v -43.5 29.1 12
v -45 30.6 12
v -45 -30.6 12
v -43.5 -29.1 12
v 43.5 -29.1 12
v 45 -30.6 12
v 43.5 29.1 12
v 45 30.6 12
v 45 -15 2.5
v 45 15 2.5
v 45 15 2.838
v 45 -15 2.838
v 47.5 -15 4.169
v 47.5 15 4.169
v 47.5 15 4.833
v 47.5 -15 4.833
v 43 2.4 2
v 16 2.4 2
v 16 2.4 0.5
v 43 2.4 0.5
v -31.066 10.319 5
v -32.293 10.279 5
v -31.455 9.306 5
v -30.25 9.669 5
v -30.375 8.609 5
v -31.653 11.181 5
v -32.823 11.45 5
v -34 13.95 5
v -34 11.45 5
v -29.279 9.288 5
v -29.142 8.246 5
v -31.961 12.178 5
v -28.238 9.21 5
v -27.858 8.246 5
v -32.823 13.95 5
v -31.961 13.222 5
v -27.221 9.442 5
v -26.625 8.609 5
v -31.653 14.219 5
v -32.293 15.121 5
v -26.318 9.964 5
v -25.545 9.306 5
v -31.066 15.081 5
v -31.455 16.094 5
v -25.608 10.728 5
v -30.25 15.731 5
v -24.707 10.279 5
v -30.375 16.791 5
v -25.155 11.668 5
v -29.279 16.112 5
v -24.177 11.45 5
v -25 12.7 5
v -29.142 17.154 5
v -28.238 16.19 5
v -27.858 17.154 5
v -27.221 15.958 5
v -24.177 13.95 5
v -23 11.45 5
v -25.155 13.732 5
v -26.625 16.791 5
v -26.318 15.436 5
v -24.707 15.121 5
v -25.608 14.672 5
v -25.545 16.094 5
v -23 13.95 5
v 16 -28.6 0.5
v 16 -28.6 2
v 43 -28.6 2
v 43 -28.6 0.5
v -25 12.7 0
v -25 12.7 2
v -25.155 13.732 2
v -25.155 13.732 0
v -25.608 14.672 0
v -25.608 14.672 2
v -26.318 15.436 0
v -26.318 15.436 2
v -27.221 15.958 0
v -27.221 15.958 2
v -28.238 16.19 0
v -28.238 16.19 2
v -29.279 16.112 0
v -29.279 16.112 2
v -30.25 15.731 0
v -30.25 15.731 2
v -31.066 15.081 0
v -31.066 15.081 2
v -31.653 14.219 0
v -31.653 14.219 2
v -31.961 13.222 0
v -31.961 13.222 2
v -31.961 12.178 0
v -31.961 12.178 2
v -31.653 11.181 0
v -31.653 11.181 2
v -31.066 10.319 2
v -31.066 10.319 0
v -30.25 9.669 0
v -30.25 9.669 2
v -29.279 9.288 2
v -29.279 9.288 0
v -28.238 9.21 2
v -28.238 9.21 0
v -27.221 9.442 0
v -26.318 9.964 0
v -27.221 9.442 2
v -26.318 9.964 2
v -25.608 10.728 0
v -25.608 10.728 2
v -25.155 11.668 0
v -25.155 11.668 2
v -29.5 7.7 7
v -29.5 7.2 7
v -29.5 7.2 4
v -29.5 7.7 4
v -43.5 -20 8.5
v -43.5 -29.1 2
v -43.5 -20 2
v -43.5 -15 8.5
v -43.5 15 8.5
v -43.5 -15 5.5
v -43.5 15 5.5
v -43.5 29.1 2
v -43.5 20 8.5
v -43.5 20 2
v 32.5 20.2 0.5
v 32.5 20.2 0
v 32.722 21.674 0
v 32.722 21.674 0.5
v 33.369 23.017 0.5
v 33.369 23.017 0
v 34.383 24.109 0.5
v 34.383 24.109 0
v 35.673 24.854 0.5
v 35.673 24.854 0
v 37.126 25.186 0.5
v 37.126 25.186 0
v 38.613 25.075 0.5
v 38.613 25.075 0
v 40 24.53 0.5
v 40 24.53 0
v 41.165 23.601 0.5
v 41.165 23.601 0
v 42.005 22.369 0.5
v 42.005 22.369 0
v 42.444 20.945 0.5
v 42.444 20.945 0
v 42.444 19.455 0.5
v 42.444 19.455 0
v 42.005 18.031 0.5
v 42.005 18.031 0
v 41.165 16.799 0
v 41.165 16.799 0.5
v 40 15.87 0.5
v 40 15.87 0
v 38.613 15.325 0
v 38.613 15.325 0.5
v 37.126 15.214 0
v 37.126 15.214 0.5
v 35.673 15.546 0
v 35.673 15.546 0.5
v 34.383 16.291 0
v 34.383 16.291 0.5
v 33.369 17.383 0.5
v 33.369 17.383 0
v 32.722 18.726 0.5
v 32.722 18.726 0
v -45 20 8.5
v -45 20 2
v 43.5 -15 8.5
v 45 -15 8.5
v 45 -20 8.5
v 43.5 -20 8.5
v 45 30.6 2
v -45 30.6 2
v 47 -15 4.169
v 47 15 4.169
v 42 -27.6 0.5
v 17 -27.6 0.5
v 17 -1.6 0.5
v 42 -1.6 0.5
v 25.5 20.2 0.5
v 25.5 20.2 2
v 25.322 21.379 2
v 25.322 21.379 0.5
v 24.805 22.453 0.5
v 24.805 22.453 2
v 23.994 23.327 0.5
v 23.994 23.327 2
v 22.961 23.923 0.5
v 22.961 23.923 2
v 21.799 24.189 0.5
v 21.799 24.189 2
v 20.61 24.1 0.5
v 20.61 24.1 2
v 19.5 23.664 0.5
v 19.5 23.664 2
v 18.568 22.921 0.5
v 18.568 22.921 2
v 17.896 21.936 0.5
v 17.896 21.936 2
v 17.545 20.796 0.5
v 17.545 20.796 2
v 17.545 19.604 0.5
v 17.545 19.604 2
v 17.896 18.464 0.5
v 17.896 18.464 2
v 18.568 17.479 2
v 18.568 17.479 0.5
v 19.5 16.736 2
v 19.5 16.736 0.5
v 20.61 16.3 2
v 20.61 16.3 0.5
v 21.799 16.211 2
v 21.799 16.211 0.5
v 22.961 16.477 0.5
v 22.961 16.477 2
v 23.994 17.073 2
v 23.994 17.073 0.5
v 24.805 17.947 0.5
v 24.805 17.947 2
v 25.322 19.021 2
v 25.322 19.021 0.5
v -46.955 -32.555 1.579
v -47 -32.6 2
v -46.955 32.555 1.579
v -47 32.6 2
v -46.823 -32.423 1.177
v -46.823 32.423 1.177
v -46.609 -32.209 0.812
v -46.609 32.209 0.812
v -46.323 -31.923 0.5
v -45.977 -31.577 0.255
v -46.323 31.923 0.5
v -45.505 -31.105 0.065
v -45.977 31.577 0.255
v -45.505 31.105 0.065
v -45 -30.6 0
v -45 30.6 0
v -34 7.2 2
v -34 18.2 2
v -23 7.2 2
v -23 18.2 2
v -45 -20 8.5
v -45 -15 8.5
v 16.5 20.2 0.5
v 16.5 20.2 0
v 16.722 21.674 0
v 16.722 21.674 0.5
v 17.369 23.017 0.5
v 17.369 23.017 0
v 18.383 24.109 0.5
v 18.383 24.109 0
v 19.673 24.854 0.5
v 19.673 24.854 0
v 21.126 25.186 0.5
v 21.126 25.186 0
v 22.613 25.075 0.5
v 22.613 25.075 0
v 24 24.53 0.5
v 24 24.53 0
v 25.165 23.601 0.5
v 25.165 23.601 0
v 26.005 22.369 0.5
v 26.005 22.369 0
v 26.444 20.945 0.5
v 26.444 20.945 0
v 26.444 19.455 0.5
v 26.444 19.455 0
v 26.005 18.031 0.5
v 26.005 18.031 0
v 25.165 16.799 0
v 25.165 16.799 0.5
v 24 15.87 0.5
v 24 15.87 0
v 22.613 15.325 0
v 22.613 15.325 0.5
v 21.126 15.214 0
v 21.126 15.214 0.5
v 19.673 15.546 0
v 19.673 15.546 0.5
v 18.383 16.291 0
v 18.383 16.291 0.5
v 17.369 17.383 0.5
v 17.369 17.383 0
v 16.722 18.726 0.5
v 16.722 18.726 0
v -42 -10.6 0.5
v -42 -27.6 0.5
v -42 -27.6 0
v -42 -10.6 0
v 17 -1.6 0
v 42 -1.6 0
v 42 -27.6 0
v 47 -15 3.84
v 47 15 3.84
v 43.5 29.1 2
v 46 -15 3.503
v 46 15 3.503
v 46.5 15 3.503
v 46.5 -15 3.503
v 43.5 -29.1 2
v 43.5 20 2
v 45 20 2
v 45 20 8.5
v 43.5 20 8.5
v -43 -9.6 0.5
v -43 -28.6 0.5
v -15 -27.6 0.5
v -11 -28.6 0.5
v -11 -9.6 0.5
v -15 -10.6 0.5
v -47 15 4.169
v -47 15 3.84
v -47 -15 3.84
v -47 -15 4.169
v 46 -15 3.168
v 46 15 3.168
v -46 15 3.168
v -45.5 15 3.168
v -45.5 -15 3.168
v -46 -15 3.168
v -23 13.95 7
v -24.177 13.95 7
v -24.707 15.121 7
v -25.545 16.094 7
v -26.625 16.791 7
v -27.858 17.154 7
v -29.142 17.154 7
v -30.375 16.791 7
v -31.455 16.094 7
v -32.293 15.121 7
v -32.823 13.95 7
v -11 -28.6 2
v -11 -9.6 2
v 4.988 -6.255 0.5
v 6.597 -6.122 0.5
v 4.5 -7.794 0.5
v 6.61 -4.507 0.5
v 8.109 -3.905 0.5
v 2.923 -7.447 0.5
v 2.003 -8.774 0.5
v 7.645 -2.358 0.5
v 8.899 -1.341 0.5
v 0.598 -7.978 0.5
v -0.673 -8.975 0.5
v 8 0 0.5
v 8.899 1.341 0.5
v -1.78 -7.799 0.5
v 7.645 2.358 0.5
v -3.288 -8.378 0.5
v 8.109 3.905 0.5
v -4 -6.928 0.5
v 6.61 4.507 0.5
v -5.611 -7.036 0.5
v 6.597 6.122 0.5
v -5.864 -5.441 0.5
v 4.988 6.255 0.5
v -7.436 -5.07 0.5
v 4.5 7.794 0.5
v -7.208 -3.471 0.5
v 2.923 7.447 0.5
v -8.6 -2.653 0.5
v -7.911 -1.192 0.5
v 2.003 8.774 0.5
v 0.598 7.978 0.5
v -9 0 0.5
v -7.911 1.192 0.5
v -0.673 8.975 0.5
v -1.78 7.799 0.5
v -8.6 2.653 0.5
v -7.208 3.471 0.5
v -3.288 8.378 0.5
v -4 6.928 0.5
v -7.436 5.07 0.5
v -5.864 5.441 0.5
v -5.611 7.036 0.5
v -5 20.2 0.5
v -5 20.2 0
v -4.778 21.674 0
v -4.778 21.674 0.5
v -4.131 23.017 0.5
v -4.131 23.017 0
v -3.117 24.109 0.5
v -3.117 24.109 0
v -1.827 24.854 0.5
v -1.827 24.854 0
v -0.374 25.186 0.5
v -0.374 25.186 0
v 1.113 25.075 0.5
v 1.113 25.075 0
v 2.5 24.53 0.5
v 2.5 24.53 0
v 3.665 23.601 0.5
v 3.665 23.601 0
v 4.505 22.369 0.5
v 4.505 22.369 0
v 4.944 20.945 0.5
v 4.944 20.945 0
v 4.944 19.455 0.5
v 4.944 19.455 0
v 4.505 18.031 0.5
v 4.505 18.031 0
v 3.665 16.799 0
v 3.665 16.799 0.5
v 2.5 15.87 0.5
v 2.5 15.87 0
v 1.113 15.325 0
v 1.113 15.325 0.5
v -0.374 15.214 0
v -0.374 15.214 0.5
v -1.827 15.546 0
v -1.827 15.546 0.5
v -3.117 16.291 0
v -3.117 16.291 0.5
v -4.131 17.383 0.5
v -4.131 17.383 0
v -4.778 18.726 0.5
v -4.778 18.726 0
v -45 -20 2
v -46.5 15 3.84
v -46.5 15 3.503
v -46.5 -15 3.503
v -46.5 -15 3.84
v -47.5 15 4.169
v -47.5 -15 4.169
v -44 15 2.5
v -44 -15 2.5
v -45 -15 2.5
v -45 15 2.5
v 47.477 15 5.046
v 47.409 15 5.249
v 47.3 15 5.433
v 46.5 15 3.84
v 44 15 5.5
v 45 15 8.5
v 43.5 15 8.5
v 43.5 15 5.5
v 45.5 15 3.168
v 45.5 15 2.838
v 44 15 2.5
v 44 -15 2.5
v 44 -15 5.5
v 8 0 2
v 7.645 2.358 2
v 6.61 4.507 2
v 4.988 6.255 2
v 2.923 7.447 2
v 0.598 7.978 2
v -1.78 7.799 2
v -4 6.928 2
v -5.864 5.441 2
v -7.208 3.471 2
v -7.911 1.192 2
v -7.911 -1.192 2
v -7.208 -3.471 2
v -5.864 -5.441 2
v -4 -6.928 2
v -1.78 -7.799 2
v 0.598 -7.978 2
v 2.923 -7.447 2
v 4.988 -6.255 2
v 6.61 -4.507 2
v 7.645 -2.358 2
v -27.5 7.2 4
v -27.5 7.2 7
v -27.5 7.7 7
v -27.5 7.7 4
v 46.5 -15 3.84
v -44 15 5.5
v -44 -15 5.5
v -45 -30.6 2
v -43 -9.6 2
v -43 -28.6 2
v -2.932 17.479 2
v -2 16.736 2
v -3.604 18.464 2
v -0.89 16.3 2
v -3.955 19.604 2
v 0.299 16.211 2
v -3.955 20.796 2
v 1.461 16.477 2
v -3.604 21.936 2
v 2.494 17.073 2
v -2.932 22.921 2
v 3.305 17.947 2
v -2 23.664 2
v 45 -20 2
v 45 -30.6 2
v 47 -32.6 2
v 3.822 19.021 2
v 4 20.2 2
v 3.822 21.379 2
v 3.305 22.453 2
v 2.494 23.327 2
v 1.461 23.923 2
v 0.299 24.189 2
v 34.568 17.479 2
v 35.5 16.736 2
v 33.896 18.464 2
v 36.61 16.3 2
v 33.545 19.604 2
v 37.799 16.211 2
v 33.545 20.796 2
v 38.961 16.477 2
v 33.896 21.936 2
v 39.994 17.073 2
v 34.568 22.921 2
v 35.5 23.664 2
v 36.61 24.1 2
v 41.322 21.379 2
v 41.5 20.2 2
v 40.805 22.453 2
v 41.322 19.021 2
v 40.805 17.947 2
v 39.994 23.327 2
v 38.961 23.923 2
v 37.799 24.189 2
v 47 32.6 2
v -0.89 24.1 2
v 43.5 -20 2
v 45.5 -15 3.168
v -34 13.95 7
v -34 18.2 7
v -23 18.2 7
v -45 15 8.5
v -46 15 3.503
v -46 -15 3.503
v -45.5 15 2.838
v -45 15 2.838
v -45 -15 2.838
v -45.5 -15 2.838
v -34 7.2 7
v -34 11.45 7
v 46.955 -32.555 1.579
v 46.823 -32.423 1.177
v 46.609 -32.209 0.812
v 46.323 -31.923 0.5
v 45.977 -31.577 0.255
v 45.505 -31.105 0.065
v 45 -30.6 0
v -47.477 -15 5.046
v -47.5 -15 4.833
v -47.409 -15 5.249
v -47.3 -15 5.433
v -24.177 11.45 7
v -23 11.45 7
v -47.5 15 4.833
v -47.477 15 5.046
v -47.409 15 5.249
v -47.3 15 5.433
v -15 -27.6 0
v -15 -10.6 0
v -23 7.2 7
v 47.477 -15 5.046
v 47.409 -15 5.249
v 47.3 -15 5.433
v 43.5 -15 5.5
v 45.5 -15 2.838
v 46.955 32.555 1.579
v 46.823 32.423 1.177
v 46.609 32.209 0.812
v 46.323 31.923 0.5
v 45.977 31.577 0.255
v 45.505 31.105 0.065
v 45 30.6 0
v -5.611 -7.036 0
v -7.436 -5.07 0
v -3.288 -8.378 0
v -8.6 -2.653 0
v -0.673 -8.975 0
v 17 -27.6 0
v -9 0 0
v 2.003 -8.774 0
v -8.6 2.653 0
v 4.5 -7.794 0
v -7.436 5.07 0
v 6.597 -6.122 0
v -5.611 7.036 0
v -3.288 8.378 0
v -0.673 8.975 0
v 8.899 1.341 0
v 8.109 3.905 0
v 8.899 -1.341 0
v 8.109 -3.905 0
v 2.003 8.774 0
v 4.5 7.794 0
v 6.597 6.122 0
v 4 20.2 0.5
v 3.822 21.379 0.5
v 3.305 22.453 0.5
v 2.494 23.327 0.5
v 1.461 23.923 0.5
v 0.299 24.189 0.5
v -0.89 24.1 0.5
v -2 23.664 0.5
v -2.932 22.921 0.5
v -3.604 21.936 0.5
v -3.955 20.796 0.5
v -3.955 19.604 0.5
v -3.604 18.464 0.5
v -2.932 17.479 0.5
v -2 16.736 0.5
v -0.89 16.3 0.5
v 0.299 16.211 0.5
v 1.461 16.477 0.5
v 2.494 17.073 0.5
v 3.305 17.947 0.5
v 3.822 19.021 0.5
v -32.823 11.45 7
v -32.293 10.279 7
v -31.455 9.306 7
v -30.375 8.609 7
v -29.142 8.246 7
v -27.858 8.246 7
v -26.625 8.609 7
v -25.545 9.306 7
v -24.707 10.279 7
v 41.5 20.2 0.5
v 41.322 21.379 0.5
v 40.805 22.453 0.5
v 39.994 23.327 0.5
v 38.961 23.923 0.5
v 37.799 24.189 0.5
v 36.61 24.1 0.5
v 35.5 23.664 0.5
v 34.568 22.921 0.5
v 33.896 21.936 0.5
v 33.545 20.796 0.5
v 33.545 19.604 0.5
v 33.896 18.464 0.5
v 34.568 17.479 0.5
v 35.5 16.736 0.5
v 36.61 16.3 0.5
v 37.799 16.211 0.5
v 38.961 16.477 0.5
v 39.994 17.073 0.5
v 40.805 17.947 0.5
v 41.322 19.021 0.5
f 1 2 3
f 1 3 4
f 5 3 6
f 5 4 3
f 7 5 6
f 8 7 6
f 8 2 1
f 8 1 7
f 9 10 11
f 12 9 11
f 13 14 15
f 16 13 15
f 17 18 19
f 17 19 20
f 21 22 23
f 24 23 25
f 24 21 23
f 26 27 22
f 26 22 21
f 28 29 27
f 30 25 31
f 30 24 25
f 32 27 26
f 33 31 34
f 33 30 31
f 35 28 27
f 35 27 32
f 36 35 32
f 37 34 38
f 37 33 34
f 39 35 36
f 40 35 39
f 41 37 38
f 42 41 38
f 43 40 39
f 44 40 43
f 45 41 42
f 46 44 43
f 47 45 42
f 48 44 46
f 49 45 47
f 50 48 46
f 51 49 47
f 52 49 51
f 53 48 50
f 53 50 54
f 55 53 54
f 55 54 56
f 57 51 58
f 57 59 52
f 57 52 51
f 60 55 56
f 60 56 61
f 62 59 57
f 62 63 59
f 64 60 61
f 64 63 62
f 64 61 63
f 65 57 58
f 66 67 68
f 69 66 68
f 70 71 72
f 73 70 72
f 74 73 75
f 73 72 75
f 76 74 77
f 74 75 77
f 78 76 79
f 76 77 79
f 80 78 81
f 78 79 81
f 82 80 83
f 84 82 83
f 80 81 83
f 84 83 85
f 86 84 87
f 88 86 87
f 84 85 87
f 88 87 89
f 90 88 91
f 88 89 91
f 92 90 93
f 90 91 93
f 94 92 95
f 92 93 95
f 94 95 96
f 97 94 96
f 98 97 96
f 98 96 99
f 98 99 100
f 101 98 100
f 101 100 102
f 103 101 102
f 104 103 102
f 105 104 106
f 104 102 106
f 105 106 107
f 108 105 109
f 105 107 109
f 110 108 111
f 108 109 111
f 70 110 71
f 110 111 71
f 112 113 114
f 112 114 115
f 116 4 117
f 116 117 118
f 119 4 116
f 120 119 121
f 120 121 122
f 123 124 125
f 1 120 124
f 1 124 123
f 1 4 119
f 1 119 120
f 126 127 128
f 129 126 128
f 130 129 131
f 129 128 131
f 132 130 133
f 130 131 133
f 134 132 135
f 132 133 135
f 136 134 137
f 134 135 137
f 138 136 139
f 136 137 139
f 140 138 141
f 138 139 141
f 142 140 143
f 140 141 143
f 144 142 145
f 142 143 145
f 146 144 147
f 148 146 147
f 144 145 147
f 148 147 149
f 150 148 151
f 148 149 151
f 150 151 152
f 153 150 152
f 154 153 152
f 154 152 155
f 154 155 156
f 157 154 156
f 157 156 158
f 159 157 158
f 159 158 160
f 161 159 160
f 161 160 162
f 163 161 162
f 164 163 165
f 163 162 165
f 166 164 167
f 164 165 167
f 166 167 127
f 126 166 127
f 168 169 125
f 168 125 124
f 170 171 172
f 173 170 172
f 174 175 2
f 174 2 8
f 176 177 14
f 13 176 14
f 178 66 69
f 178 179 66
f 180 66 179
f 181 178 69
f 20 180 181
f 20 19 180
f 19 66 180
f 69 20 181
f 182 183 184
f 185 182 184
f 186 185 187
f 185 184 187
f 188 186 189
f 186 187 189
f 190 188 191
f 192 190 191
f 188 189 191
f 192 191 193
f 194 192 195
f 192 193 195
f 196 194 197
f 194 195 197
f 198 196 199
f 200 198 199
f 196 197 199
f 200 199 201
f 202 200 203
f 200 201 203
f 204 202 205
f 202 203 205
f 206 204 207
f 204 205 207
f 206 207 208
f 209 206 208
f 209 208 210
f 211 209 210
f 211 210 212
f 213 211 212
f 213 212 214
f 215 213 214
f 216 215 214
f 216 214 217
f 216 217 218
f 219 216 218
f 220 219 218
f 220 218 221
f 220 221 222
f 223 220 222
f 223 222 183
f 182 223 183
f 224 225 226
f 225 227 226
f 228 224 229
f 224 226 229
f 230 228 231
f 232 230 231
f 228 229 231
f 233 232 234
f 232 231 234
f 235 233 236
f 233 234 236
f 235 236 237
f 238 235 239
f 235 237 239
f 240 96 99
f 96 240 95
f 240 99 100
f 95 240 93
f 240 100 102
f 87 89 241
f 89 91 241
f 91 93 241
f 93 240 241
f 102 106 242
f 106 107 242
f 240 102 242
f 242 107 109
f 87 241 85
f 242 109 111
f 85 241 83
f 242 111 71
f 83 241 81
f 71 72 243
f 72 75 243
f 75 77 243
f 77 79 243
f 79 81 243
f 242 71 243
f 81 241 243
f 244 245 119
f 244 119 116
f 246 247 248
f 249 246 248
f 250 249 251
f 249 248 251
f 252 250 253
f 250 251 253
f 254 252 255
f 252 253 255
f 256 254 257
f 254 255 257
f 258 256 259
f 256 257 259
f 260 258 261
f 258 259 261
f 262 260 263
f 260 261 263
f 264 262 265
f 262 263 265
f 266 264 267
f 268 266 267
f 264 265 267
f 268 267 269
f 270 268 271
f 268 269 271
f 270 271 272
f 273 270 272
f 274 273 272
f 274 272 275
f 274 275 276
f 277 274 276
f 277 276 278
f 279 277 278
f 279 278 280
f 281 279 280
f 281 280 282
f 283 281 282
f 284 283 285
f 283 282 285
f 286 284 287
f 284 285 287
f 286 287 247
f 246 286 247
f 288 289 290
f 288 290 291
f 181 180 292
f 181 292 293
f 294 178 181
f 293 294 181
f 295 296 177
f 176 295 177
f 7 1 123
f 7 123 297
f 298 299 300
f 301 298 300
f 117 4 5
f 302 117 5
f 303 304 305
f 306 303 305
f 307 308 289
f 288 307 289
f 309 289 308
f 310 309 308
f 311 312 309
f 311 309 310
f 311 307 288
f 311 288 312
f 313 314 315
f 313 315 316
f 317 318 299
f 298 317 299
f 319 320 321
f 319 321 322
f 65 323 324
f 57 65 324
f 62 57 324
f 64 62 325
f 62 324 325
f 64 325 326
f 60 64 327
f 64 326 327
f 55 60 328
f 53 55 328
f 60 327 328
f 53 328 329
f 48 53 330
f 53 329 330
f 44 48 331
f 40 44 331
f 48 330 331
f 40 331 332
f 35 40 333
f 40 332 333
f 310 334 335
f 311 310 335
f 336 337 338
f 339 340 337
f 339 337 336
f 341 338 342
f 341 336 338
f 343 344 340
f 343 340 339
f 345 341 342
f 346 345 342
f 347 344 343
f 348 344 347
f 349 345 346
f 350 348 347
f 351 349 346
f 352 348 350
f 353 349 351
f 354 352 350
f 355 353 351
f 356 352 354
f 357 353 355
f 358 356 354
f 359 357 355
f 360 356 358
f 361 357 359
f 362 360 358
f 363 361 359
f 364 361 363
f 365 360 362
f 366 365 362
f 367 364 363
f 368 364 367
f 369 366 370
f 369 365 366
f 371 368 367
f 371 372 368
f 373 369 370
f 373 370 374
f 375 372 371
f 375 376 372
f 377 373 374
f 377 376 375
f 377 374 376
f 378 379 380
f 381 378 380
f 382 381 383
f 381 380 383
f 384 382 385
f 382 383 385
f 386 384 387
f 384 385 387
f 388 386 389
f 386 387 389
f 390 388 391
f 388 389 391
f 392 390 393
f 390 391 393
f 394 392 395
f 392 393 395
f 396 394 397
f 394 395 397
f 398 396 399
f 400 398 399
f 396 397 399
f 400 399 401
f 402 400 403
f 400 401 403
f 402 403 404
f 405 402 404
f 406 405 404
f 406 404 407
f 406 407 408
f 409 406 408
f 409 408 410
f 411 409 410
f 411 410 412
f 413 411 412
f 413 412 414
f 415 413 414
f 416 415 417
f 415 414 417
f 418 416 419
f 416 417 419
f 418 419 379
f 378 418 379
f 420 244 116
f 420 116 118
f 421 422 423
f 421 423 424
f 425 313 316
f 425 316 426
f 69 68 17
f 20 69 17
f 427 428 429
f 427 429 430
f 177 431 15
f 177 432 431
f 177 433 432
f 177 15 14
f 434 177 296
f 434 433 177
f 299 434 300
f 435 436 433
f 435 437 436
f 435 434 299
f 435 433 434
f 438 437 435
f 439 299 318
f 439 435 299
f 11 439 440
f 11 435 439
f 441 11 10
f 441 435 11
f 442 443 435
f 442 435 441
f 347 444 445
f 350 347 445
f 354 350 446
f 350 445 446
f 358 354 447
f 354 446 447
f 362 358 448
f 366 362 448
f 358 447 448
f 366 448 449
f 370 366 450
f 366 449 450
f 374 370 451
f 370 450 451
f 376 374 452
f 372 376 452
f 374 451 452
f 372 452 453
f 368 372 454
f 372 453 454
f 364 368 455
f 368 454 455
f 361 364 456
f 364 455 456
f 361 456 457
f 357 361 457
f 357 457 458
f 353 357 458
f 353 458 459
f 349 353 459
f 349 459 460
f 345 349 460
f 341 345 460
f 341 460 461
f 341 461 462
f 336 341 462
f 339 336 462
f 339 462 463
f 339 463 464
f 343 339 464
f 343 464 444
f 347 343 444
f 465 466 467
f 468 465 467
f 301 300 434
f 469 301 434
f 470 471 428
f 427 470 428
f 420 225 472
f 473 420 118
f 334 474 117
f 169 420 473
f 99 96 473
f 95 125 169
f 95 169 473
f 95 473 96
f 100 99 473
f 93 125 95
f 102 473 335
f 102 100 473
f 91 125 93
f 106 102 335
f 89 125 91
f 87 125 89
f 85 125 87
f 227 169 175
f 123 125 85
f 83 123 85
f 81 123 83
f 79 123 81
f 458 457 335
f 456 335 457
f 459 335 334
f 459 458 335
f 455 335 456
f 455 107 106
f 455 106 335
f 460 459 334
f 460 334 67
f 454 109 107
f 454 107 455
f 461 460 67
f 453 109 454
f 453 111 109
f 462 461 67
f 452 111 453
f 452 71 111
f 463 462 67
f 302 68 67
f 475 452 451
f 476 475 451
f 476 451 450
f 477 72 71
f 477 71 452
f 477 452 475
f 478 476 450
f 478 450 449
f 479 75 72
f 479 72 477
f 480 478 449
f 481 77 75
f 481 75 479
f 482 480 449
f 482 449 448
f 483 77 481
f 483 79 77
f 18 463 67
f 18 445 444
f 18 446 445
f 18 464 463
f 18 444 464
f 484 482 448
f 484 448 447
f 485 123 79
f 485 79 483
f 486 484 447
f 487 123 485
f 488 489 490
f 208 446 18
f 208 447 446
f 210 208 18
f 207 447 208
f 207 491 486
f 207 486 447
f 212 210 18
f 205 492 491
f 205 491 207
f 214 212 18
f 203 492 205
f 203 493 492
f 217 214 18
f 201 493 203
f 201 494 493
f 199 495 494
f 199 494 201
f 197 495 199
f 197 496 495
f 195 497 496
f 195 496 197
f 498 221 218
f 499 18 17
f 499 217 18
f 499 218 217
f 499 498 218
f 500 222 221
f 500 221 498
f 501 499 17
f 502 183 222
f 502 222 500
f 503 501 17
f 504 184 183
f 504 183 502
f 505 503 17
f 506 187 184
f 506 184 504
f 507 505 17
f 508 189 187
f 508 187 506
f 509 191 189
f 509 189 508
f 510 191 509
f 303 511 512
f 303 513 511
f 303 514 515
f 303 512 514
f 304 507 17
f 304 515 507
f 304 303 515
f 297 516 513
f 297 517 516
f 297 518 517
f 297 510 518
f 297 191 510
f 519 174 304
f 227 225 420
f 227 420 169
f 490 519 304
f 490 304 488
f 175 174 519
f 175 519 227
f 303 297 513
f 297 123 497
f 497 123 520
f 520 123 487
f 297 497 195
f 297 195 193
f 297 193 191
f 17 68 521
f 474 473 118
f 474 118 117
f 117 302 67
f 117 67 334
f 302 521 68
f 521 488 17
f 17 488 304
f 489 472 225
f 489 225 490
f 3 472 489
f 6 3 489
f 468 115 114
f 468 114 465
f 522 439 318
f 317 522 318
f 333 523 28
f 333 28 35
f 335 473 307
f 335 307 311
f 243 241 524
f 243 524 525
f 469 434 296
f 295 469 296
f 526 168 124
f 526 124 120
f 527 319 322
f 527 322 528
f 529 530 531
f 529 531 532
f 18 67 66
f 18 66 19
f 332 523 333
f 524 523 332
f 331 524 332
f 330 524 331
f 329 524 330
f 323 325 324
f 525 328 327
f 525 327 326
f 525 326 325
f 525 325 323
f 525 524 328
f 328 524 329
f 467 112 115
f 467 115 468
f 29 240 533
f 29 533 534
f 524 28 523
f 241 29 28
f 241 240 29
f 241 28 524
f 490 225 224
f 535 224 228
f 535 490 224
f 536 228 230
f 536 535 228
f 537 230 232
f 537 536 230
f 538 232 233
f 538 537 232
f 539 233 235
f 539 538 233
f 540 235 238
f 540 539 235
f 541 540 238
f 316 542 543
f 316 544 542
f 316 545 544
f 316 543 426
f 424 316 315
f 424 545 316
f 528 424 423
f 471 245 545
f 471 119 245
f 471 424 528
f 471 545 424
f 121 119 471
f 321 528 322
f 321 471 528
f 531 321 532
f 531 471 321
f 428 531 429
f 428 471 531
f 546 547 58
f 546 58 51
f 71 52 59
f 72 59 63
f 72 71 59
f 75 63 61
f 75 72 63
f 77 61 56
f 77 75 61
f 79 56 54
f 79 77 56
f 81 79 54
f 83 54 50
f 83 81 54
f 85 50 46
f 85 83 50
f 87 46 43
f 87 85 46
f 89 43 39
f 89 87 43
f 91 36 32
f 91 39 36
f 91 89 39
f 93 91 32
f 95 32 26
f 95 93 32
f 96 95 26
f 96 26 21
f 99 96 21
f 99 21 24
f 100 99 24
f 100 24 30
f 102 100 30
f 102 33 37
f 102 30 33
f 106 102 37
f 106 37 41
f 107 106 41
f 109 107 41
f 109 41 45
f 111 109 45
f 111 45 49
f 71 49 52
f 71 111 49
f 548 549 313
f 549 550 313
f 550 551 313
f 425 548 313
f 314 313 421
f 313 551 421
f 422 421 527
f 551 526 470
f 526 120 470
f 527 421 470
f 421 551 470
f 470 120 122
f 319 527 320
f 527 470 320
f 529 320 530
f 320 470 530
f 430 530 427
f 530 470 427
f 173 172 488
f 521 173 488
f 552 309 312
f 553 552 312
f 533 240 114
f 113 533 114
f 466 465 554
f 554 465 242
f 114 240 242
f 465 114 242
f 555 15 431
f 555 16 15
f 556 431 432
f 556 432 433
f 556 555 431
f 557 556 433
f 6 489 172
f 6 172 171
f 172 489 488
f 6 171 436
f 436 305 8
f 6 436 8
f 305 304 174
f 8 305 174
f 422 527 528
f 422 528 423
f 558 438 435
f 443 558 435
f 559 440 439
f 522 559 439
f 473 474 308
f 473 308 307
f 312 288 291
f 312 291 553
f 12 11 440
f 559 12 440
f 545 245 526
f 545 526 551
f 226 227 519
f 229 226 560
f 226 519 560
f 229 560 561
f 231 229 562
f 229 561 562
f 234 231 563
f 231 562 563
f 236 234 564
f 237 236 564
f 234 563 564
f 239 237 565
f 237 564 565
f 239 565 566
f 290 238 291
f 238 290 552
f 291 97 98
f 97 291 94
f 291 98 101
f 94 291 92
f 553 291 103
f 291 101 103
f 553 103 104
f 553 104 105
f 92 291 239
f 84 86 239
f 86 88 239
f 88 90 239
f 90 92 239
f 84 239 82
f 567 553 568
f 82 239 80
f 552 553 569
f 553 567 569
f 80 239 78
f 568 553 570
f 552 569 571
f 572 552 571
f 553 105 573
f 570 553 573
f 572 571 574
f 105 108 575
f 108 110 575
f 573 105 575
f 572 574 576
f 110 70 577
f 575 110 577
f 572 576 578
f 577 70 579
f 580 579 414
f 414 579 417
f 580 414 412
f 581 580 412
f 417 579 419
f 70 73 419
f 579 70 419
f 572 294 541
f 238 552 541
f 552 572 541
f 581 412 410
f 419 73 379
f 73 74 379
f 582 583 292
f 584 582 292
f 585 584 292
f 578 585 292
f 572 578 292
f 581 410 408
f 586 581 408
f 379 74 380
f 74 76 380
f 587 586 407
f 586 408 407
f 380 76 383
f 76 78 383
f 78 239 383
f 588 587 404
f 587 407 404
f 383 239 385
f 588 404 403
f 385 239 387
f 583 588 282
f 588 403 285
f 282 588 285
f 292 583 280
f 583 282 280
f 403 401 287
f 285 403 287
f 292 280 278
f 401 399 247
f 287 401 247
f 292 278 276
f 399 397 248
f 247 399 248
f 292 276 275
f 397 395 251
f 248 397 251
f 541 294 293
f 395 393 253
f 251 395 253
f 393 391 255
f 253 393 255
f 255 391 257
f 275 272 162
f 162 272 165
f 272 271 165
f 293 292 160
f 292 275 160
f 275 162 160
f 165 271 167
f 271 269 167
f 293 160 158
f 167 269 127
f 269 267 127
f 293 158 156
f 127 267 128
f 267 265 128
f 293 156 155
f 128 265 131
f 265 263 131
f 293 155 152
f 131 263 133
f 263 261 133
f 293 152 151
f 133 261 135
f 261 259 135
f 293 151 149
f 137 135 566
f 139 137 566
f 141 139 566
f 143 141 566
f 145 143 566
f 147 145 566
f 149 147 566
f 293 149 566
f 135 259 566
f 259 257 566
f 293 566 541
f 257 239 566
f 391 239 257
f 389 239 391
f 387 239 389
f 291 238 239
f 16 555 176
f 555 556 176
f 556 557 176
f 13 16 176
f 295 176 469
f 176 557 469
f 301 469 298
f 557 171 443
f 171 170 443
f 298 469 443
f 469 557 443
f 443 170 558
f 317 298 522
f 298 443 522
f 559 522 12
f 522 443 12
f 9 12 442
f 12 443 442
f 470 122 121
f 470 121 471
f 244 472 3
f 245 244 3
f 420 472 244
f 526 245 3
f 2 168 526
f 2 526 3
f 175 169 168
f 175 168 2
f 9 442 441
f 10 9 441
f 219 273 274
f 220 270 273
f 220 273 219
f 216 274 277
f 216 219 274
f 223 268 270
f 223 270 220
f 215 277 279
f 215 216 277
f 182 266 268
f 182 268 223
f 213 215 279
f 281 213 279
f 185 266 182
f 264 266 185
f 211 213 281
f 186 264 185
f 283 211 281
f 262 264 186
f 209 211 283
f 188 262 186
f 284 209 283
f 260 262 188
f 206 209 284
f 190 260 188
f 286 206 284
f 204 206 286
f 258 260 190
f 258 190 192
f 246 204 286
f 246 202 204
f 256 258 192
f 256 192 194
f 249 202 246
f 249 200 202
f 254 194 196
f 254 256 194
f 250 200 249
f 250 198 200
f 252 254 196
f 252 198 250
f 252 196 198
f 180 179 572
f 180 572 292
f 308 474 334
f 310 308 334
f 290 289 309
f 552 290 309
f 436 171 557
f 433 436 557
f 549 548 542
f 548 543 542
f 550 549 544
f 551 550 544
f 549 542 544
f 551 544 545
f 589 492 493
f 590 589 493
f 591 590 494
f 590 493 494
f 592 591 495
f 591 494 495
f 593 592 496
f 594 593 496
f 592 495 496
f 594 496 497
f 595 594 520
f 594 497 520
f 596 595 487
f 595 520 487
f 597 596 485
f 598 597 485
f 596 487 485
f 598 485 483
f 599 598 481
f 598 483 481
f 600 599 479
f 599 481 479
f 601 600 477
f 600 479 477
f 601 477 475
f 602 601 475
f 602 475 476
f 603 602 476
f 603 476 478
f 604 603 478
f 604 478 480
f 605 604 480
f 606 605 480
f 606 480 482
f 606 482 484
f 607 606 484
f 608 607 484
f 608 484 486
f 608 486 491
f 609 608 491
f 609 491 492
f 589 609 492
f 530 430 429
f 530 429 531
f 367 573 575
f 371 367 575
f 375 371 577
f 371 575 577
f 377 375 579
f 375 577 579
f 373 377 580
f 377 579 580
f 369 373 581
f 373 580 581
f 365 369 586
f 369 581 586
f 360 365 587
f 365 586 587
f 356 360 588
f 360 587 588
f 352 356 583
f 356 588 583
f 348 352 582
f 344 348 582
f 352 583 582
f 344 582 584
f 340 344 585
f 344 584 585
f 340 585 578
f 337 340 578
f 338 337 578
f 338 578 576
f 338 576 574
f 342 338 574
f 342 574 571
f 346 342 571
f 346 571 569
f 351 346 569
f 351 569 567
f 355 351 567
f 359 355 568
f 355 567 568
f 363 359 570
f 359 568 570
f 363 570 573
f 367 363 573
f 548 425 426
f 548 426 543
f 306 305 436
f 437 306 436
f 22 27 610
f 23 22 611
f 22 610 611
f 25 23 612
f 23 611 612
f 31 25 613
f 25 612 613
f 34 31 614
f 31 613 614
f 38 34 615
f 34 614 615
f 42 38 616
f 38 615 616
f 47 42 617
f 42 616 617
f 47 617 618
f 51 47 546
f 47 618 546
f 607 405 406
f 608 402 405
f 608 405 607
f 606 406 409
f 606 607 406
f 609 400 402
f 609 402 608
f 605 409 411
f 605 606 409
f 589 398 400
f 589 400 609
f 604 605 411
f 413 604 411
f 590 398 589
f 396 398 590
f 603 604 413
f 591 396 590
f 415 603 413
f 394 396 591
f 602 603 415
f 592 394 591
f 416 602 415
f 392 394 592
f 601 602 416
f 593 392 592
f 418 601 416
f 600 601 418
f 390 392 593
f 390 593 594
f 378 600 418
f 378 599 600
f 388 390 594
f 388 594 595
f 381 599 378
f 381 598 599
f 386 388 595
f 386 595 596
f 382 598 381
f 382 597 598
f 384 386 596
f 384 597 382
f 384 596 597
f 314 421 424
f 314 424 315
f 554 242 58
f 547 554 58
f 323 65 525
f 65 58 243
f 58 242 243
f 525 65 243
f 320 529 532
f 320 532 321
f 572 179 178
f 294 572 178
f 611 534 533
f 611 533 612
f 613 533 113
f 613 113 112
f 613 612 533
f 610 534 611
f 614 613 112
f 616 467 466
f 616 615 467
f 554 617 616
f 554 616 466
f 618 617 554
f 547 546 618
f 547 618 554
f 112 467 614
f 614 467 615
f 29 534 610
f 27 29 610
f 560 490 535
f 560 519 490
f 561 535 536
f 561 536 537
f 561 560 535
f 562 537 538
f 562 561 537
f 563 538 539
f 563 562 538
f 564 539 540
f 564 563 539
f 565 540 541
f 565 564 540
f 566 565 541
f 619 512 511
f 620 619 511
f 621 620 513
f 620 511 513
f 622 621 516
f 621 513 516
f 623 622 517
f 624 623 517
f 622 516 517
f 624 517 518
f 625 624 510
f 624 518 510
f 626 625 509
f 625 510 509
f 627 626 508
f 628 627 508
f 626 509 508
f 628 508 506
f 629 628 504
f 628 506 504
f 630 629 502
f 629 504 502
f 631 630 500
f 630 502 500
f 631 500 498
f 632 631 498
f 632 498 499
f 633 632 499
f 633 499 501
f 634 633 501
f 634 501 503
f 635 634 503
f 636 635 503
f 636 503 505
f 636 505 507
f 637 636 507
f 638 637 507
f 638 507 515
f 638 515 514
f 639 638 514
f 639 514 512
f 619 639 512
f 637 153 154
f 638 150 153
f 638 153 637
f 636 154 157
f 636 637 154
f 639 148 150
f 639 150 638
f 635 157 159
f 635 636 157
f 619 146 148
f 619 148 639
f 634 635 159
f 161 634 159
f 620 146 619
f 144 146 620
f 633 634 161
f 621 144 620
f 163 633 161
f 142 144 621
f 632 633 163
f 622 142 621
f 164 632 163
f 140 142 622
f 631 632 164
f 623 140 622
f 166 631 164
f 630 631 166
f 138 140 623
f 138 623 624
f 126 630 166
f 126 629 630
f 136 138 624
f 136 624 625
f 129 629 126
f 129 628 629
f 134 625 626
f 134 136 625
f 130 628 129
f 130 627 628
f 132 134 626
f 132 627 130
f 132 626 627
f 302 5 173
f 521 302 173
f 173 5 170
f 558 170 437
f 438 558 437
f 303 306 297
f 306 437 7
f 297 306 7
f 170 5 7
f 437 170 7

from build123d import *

# Parameters (mm, degrees)
SKETCH_1_W             = 94
SKETCH_1_H             = 65.2
EXTRUDE_1_DEPTH        = 2
SKETCH_2_R             = 8
SKETCH_2_R_2           = 3.5
SKETCH_2_R_3           = 4
SKETCH_2_W             = 27
SKETCH_2_H             = 17
SKETCH_2_W_2           = 25
SKETCH_2_H_2           = 26
CUT_EXTRUDE_1_DEPTH    = 2
SKETCH_3_W             = 90
SKETCH_3_H             = 61.2
SKETCH_3_W_2           = 86
SKETCH_3_H_2           = 57.2
EXTRUDE_2_DEPTH        = 10
SKETCH_4_R             = 9
SKETCH_4_R_2           = 5
CUT_EXTRUDE_4_DEPTH    = 0.5
SKETCH_5_W             = 27
SKETCH_5_H             = 31
SKETCH_5_W_2           = 32
SKETCH_5_H_2           = 19
CUT_EXTRUDE_5_DEPTH    = 1.5
SKETCH_6_W             = 12
SKETCH_6_H             = 12
SKETCH_6_R             = 3.5
EXTRUDE_4_DEPTH        = 5
SKETCH_7_W             = 2
SKETCH_7_H             = 1
CUT_EXTRUDE_6_DEPTH    = 3
CUT_EXTRUDE_7_DEPTH    = 2
SKETCH_10_W            = 6
SKETCH_10_H            = 30
EXTRUDE_5_DEPTH        = 3
CUT_EXTRUDE_9_DEPTH    = 30
CUT_EXTRUDE_10_DEPTH   = 30
CUT_EXTRUDE_11_DEPTH   = 30
FILLET_1_R             = 1
FILLET_2_R             = 2
FILLET_1_OF_MIRROR_9_R = 1
SKETCH_17_R            = 4.5
CUT_EXTRUDE_13_DEPTH   = 2
SKETCH_18_W            = 1.677095884
SKETCH_18_H            = 2.5
CUT_EXTRUDE_14_DEPTH   = 2
SKETCH_19_W            = 1
SKETCH_19_H            = 3
CUT_EXTRUDE_15_DEPTH   = 30
SKETCH_21_W            = 87
SKETCH_21_H            = 58.2
SKETCH_21_W_2          = 86
SKETCH_21_H_2          = 57.2
CUT_EXTRUDE_27_DEPTH   = 10
CUT_EXTRUDE_START      = -7
SKETCH_24_W            = 12
SKETCH_24_H            = 12
SKETCH_24_W_2          = 11
SKETCH_24_H_2          = 11
CUT_EXTRUDE_28_DEPTH   = 7


with BuildPart() as part:
    # 草图1 → 凸台-拉伸1 (new body)
    with BuildSketch(Plane.XY):
        Rectangle(SKETCH_1_W, SKETCH_1_H)
    extrude(amount=EXTRUDE_1_DEPTH)

    # 草图2 → 切除-拉伸1 (cut)
    with BuildSketch(Plane.XY.offset(2)):
        Circle(SKETCH_2_R)
        with Locations((-28.5, 12.7)):
            Circle(SKETCH_2_R_2)
        with Locations((37.5, 20.2)):
            Circle(SKETCH_2_R_3)
        with Locations((21.5, 20.2)):
            Circle(SKETCH_2_R_3)
        with Locations((0, 20.2)):
            Circle(SKETCH_2_R_3)
        with Locations((-28.5, -19.1)):
            Rectangle(SKETCH_2_W, SKETCH_2_H)
        with Locations((29.5, -14.6)):
            Rectangle(SKETCH_2_W_2, SKETCH_2_H_2)
    extrude(amount=-CUT_EXTRUDE_1_DEPTH, mode=Mode.SUBTRACT)

    # 草图3 → 凸台-拉伸2 (add)
    with BuildSketch(Plane.XY.offset(2)):
        Rectangle(SKETCH_3_W, SKETCH_3_H)
        Rectangle(SKETCH_3_W_2, SKETCH_3_H_2, mode=Mode.SUBTRACT)
    extrude(amount=EXTRUDE_2_DEPTH)

    # 草图4 → 切除-拉伸4 (cut)
    with BuildSketch(Plane(origin=(0, 0, 0), x_dir=(-1, 0, 0), z_dir=(0, 0, -1))):
        Circle(SKETCH_4_R)
        with Locations((0, 20.2)):
            Circle(SKETCH_4_R_2)
        with Locations((-21.5, 20.2)):
            Circle(SKETCH_4_R_2)
        with Locations((-37.5, 20.2)):
            Circle(SKETCH_4_R_2)
    extrude(amount=-CUT_EXTRUDE_4_DEPTH, mode=Mode.SUBTRACT)

    # 草图5 → 切除-拉伸5 (cut)
    with BuildSketch(Plane.XY.offset(2)):
        with Locations((29.5, -13.1)):
            Rectangle(SKETCH_5_W, SKETCH_5_H)
        with Locations((-27, -19.1)):
            Rectangle(SKETCH_5_W_2, SKETCH_5_H_2)
    extrude(amount=-CUT_EXTRUDE_5_DEPTH, mode=Mode.SUBTRACT)

    # 草图9 → 切除-拉伸7 (cut)
    with BuildSketch(Plane(origin=(45, 0, 0), x_dir=(0, 0, -1), z_dir=(1, 0, 0))):
        Polygon((-8.5, 20), (-8.5, 15), (-2.5, 15), (-2.5, -15), (-8.5, -15), (-8.5, -20), (-4.518745162, -20), (-2, -20), (-2, 20), align=None)
    cut_extrude_7 = extrude(amount=-CUT_EXTRUDE_7_DEPTH, mode=Mode.SUBTRACT)

    # 草图10 → 凸台-拉伸5 (add)
    with BuildSketch(Plane(origin=(45, 0, 0), x_dir=(0, 0, -1), z_dir=(1, 0, 0))):
        with Locations((-5.5, 0)):
            Rectangle(SKETCH_10_W, SKETCH_10_H)
    extrude_5 = extrude(amount=EXTRUDE_5_DEPTH)

    # 草图13 → 切除-拉伸9 (cut)
    with BuildSketch(Plane(origin=(0, 15, 0), x_dir=(1, 0, 0), z_dir=(0, 1, 0))):
        Polygon((48, -4.5), (48, -2.5), (45, -2.5), (45, -2.837675063), (45.5, -2.837675063), (45.5, -3.168378765), (46, -3.168378765), (46, -3.502957406), (46.5, -3.502957406), (46.5, -3.840024676), (47, -3.840024676), (47, -4.169256843), (47.5, -4.169256843), (47.5, -4.5), align=None)
    cut_extrude_9 = extrude(amount=-CUT_EXTRUDE_9_DEPTH, mode=Mode.SUBTRACT)

    # 草图14 → 切除-拉伸10 (cut)
    with BuildSketch(Plane(origin=(0, 15, 0), x_dir=(1, 0, 0), z_dir=(0, 1, 0))):
        Polygon((45, -8.5), (48, -4.5), (48, -8.5), align=None)
    cut_extrude_10 = extrude(amount=-CUT_EXTRUDE_10_DEPTH, mode=Mode.SUBTRACT)

    # 草图15 → 切除-拉伸11 (cut)
    with BuildSketch(Plane(origin=(0, 15, 0), x_dir=(1, 0, 0), z_dir=(0, 1, 0))):
        Polygon((47.5, -4.5), (47.5, -5.166666667), (48, -4.5), align=None)
    cut_extrude_11 = extrude(amount=-CUT_EXTRUDE_11_DEPTH, mode=Mode.SUBTRACT)

    # 圆角1
    fillet_1_edges = [part.edges().sort_by_distance(p)[0] for p in [
        (47.5, 0, 5.166666667),
    ]]
    fillet(fillet_1_edges, radius=FILLET_1_R)

    # 圆角2
    fillet_2_edges = [part.edges().sort_by_distance(p)[0] for p in [
        (47, 0, 0),
        (0, -32.6, 0),
        (-47, 0, 0),
        (0, 32.6, 0),
    ]]
    fillet(fillet_2_edges, radius=FILLET_2_R - 0.0001)  # a hair under: the kernel refuses the full size

    # 镜向9: 切除-拉伸7, 凸台-拉伸5, 切除-拉伸9, 切除-拉伸10, 切除-拉伸11 across plane
    add(cut_extrude_7.mirror(Plane(origin=(0, 0, 0), x_dir=(0, 0, 1), z_dir=(1, 0, 0))), mode=Mode.SUBTRACT)
    add(extrude_5.mirror(Plane(origin=(0, 0, 0), x_dir=(0, 0, 1), z_dir=(1, 0, 0))))
    add(cut_extrude_9.mirror(Plane(origin=(0, 0, 0), x_dir=(0, 0, 1), z_dir=(1, 0, 0))), mode=Mode.SUBTRACT)
    add(cut_extrude_10.mirror(Plane(origin=(0, 0, 0), x_dir=(0, 0, 1), z_dir=(1, 0, 0))), mode=Mode.SUBTRACT)
    add(cut_extrude_11.mirror(Plane(origin=(0, 0, 0), x_dir=(0, 0, 1), z_dir=(1, 0, 0))), mode=Mode.SUBTRACT)

    # 圆角1 of 镜向9
    fillet_1_of_mirror_9_edges = [part.edges().sort_by_distance(p)[0] for p in [
        (-47.5, 0, 5.166666667),
    ]]
    fillet(fillet_1_of_mirror_9_edges, radius=FILLET_1_OF_MIRROR_9_R)

    # 草图19 → 切除-拉伸15 (cut)
    with BuildSketch(Plane(origin=(0, 15, 0), x_dir=(1, 0, 0), z_dir=(0, 1, 0))):
        with Locations((43.5, -4)):
            Rectangle(SKETCH_19_W, SKETCH_19_H)
    cut_extrude_15 = extrude(amount=-CUT_EXTRUDE_15_DEPTH, mode=Mode.SUBTRACT)

    # 镜向11: 切除-拉伸15 across plane
    add(cut_extrude_15.mirror(Plane(origin=(0, 0, 0), x_dir=(0, 0, 1), z_dir=(1, 0, 0))), mode=Mode.SUBTRACT)

    # 草图21 → 切除-拉伸27 (cut)
    with BuildSketch(Plane.XY.offset(12)):
        Rectangle(SKETCH_21_W, SKETCH_21_H)
        Rectangle(SKETCH_21_W_2, SKETCH_21_H_2, mode=Mode.SUBTRACT)
    extrude(amount=-CUT_EXTRUDE_27_DEPTH, mode=Mode.SUBTRACT)


with BuildPart() as body_2:
    # 草图6 → 凸台-拉伸4 (new body)
    with BuildSketch(Plane.XY.offset(2)):
        with Locations((-28.5, 12.7)):
            Rectangle(SKETCH_6_W, SKETCH_6_H)
        with Locations((-28.5, 12.7)):
            Circle(SKETCH_6_R, mode=Mode.SUBTRACT)
    extrude(amount=EXTRUDE_4_DEPTH)

    # 草图7 → 切除-拉伸6 (cut)
    with BuildSketch(Plane.XY.offset(7)):
        with Locations((-28.5, 7.2)):
            Rectangle(SKETCH_7_W, SKETCH_7_H)
    extrude(amount=-CUT_EXTRUDE_6_DEPTH, mode=Mode.SUBTRACT)

    # 草图17 → 切除-拉伸13 (cut)
    with BuildSketch(Plane.XY.offset(7)):
        with Locations((-28.5, 12.7)):
            Circle(SKETCH_17_R)
    extrude(amount=-CUT_EXTRUDE_13_DEPTH, mode=Mode.SUBTRACT)

    # 草图18 → 切除-拉伸14 (cut)
    with BuildSketch(Plane.XY.offset(7)):
        with Locations((-33.661452058, 12.7)):
            Rectangle(SKETCH_18_W, SKETCH_18_H)
    cut_extrude_14 = extrude(amount=-CUT_EXTRUDE_14_DEPTH, mode=Mode.SUBTRACT)

    # 镜向10: 切除-拉伸14 across plane
    add(cut_extrude_14.mirror(Plane(origin=(-28.5, 0, 0), x_dir=(0, 0, 1), z_dir=(1, 0, 0))), mode=Mode.SUBTRACT)

    # 草图24 → 切除-拉伸28 (cut)
    with BuildSketch(Plane.XY.offset(7).offset(CUT_EXTRUDE_START)):
        with Locations((-28.5, 12.7)):
            Rectangle(SKETCH_24_W, SKETCH_24_H)
        with Locations((-28.5, 12.7)):
            Rectangle(SKETCH_24_W_2, SKETCH_24_H_2, mode=Mode.SUBTRACT)
    extrude(amount=CUT_EXTRUDE_28_DEPTH, mode=Mode.SUBTRACT)


solid = Compound([part.part, body_2.part])
